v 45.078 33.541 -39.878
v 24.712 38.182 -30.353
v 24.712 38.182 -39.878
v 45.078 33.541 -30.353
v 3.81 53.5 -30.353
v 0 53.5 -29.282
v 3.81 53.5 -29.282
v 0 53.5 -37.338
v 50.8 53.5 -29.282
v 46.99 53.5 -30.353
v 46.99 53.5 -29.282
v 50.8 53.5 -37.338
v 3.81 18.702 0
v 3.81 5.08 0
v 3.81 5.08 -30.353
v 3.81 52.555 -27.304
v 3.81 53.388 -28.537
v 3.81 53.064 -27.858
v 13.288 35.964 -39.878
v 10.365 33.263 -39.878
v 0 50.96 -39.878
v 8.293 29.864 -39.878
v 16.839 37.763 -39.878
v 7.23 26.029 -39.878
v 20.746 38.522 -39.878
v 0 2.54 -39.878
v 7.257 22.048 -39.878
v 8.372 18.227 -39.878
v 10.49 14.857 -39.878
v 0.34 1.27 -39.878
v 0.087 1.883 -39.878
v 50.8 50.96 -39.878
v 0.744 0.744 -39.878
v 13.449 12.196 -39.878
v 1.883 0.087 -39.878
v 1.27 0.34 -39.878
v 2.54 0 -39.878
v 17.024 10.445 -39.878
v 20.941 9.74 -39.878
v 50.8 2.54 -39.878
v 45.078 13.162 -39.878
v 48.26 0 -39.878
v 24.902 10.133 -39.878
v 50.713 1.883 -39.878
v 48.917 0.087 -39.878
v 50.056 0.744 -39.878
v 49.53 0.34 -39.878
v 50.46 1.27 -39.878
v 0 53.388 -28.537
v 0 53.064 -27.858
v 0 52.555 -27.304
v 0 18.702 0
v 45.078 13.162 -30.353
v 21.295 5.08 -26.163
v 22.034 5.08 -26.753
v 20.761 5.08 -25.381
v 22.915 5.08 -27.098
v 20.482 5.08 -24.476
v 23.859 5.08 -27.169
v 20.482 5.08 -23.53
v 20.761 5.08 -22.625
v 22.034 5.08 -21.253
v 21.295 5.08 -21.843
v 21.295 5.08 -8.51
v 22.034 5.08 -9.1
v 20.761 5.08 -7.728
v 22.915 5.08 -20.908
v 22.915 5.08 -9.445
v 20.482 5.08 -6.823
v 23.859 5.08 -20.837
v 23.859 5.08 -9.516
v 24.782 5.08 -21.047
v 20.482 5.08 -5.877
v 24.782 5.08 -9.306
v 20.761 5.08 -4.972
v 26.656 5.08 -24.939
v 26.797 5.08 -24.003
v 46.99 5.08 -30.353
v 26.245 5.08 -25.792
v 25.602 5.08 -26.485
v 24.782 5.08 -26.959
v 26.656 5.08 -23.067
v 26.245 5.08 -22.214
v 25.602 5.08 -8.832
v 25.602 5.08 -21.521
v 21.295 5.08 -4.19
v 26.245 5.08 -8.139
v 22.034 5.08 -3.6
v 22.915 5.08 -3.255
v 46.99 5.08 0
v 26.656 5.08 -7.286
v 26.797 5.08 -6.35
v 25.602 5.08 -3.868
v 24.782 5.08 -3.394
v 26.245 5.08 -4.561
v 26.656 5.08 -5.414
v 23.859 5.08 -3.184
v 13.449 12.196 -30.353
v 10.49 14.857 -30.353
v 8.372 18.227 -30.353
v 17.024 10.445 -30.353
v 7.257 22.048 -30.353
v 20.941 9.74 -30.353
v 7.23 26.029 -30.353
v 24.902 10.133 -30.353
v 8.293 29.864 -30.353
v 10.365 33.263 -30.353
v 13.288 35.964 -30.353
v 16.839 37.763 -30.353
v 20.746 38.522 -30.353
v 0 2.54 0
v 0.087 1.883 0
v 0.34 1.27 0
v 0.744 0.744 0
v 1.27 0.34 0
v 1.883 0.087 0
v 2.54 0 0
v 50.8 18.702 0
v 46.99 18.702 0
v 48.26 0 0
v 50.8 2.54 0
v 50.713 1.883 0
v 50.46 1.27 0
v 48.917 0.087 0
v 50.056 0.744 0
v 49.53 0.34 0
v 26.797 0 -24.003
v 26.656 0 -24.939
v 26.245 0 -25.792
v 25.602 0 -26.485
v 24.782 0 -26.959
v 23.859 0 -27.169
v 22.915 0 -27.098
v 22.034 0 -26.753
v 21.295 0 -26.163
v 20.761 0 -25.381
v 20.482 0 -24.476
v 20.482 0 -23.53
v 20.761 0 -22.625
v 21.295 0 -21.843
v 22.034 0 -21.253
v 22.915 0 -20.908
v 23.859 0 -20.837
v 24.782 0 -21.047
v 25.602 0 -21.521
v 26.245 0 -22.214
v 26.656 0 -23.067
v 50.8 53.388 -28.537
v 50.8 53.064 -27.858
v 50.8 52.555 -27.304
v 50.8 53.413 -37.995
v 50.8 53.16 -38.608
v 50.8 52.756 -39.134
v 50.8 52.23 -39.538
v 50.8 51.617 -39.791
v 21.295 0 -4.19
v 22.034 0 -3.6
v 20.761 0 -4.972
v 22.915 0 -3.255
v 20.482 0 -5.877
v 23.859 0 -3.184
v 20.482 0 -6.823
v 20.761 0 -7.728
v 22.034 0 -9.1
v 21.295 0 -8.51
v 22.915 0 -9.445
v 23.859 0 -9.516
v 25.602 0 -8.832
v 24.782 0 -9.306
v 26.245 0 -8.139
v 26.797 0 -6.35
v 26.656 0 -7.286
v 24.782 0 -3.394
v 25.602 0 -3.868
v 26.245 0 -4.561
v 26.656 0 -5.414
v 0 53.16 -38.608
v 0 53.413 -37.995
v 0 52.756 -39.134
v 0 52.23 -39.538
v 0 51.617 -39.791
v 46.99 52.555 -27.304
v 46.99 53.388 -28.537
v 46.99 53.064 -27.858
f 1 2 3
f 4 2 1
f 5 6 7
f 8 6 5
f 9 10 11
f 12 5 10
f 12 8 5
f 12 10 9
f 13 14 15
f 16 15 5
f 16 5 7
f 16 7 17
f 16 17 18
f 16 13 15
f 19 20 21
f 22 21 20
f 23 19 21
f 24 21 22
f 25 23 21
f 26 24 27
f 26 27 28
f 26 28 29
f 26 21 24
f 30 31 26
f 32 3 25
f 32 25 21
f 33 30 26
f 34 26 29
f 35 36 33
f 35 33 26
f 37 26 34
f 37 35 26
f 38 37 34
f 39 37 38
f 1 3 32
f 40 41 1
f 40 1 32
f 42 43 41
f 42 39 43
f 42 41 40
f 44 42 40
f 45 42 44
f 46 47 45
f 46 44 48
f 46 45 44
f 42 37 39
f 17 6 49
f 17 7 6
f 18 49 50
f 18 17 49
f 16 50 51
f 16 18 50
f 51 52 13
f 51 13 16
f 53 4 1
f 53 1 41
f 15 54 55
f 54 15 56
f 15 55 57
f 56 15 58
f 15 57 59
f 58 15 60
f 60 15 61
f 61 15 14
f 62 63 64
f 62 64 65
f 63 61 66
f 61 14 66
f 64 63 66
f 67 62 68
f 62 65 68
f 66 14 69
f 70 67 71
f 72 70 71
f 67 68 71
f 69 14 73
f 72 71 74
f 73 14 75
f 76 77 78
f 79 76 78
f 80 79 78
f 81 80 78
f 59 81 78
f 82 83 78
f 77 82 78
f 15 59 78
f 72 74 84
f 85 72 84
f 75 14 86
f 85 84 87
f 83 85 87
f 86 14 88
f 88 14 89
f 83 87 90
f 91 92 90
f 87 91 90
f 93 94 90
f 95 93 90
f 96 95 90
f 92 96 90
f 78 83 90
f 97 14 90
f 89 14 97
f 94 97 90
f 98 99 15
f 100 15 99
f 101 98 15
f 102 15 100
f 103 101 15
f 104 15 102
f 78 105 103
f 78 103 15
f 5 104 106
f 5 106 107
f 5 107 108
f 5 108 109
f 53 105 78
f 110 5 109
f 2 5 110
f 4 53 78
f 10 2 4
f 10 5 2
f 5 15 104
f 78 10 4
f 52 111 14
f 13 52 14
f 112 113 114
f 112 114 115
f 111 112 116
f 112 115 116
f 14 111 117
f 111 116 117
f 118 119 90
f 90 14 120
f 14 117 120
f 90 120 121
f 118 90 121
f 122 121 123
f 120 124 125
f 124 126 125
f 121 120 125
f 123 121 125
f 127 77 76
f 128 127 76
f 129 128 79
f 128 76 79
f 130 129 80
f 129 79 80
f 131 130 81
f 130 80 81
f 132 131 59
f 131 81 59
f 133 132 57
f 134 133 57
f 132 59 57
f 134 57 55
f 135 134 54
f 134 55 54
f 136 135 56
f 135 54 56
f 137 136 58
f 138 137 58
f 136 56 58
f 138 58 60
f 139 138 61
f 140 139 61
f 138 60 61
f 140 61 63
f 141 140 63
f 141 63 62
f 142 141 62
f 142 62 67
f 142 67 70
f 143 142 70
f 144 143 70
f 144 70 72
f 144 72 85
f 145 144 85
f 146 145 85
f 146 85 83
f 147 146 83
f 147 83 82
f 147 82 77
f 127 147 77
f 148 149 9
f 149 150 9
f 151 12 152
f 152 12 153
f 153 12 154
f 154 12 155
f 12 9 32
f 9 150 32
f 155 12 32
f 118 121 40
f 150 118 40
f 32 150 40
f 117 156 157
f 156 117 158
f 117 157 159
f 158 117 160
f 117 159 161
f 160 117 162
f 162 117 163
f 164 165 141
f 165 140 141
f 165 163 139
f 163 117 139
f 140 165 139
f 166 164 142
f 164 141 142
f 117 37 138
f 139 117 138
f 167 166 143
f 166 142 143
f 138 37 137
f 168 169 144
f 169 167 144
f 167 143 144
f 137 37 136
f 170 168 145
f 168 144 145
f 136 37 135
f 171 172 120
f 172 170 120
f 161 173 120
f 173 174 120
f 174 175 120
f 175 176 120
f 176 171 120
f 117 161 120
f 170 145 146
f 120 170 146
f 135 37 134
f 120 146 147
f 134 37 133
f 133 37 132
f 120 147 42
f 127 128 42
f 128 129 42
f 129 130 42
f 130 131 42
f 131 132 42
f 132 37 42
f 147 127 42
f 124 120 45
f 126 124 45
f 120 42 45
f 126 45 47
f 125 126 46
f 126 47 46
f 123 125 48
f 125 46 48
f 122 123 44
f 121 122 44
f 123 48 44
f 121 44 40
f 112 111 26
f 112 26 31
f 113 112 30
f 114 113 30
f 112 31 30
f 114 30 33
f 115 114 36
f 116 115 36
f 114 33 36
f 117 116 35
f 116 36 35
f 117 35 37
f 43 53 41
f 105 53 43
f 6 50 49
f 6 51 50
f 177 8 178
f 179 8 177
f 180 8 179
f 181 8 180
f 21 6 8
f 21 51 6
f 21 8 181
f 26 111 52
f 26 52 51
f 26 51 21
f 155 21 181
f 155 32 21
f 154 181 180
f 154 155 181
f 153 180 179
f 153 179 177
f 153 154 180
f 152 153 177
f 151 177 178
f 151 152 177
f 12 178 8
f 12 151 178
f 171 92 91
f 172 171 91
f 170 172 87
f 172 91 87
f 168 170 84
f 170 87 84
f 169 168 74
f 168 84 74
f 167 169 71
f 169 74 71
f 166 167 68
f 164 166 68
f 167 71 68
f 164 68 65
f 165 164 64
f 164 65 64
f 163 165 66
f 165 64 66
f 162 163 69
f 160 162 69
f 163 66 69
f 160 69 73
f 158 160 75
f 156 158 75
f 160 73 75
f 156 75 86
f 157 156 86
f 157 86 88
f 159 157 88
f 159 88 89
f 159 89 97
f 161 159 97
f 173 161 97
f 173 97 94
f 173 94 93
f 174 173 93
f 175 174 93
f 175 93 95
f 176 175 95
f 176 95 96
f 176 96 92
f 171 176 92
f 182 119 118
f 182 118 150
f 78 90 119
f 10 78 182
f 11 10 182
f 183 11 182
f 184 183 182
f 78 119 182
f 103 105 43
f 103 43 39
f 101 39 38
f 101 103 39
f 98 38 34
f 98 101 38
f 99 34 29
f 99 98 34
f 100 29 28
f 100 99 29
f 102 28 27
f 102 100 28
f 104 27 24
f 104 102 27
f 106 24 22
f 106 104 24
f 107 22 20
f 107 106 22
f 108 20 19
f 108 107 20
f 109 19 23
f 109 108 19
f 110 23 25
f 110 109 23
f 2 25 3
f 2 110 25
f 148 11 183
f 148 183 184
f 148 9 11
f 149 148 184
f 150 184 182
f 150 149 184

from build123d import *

# Parameters (mm, degrees)
SKETCH1_W           = 50.8
SKETCH1_H           = 39.878
BOSS_EXTRUDE1_DEPTH = 53.499926347
SKETCH3_W           = 43.18
SKETCH3_H           = 50.8
CUT_EXTRUDE1_DEPTH  = 30.353
CUT_EXTRUDE2_DEPTH  = 51.8
FILLET3_R           = 2.54
FILLET4_R           = 2.54
FILLET5_R           = 2.54
SKETCH5_R           = 3.175
CUT_EXTRUDE3_DEPTH  = 6.08
CUT_EXTRUDE4_DEPTH  = 25.4


with BuildPart() as part:
    # Sketch1 → Boss-Extrude1 (new body)
    with BuildSketch(Plane(origin=(0, 0, 0), x_dir=(1, 0, 0), z_dir=(0, 1, 0))):
        with Locations((25.4, 19.939)):
            Rectangle(SKETCH1_W, SKETCH1_H)
    extrude(amount=BOSS_EXTRUDE1_DEPTH)

    # Sketch3 → Cut-Extrude1 (cut)
    with BuildSketch(Plane.XY):
        with Locations((25.4, 30.48)):
            Rectangle(SKETCH3_W, SKETCH3_H)
    extrude(amount=-CUT_EXTRUDE1_DEPTH, mode=Mode.SUBTRACT)

    # Sketch4 → Cut-Extrude2 (cut, through all)
    with BuildSketch(Plane.ZY):
        Polygon((0, 18.701926347), (-28.067, 53.499926347), (0, 53.499926347), align=None)
    extrude(amount=-CUT_EXTRUDE2_DEPTH, mode=Mode.SUBTRACT)

    # Fillet3
    fillet3_edges = [part.edges().sort_by_distance(p)[0] for p in [
        (25.4, 53.499926347, -39.878),
    ]]
    fillet(fillet3_edges, radius=FILLET3_R)

    # Fillet4
    fillet4_edges = [part.edges().sort_by_distance(p)[0] for p in [
        (48.895, 53.499926347, -28.067),
        (1.905, 53.499926347, -28.067),
    ]]
    fillet(fillet4_edges, radius=FILLET4_R)

    # Fillet5
    fillet5_edges = [part.edges().sort_by_distance(p)[0] for p in [
        (50.8, 0, -19.939),
        (0, 0, -19.939),
    ]]
    fillet(fillet5_edges, radius=FILLET5_R)

    # Sketch5 → Cut-Extrude3 (cut, through all)
    with BuildSketch(Plane(origin=(0, 5.08, 0), x_dir=(1, 0, 0), z_dir=(0, 1, 0))):
        with Locations((23.622, 6.35)):
            Circle(SKETCH5_R)
        with Locations((23.622, 24.003)):
            Circle(SKETCH5_R)
    extrude(amount=-CUT_EXTRUDE3_DEPTH, mode=Mode.SUBTRACT)

    # Sketch13 → Cut-Extrude4 (cut)
    with BuildSketch(Plane.XY.offset(-30.353)):
        with BuildLine():
            Line((45.078473315, 33.54111133), (45.078473315, 13.162010507))
            Line((45.078473315, 13.162010507), (24.90196768, 10.132947276))
            ThreePointArc((24.90196768, 10.132947276), (7.104992388, 24.03759453), (24.712163172, 38.181818856))
            Line((24.712163172, 38.181818856), (45.078473315, 33.54111133))
        make_face()
    extrude(amount=-CUT_EXTRUDE4_DEPTH, mode=Mode.SUBTRACT)


solid = part.part
